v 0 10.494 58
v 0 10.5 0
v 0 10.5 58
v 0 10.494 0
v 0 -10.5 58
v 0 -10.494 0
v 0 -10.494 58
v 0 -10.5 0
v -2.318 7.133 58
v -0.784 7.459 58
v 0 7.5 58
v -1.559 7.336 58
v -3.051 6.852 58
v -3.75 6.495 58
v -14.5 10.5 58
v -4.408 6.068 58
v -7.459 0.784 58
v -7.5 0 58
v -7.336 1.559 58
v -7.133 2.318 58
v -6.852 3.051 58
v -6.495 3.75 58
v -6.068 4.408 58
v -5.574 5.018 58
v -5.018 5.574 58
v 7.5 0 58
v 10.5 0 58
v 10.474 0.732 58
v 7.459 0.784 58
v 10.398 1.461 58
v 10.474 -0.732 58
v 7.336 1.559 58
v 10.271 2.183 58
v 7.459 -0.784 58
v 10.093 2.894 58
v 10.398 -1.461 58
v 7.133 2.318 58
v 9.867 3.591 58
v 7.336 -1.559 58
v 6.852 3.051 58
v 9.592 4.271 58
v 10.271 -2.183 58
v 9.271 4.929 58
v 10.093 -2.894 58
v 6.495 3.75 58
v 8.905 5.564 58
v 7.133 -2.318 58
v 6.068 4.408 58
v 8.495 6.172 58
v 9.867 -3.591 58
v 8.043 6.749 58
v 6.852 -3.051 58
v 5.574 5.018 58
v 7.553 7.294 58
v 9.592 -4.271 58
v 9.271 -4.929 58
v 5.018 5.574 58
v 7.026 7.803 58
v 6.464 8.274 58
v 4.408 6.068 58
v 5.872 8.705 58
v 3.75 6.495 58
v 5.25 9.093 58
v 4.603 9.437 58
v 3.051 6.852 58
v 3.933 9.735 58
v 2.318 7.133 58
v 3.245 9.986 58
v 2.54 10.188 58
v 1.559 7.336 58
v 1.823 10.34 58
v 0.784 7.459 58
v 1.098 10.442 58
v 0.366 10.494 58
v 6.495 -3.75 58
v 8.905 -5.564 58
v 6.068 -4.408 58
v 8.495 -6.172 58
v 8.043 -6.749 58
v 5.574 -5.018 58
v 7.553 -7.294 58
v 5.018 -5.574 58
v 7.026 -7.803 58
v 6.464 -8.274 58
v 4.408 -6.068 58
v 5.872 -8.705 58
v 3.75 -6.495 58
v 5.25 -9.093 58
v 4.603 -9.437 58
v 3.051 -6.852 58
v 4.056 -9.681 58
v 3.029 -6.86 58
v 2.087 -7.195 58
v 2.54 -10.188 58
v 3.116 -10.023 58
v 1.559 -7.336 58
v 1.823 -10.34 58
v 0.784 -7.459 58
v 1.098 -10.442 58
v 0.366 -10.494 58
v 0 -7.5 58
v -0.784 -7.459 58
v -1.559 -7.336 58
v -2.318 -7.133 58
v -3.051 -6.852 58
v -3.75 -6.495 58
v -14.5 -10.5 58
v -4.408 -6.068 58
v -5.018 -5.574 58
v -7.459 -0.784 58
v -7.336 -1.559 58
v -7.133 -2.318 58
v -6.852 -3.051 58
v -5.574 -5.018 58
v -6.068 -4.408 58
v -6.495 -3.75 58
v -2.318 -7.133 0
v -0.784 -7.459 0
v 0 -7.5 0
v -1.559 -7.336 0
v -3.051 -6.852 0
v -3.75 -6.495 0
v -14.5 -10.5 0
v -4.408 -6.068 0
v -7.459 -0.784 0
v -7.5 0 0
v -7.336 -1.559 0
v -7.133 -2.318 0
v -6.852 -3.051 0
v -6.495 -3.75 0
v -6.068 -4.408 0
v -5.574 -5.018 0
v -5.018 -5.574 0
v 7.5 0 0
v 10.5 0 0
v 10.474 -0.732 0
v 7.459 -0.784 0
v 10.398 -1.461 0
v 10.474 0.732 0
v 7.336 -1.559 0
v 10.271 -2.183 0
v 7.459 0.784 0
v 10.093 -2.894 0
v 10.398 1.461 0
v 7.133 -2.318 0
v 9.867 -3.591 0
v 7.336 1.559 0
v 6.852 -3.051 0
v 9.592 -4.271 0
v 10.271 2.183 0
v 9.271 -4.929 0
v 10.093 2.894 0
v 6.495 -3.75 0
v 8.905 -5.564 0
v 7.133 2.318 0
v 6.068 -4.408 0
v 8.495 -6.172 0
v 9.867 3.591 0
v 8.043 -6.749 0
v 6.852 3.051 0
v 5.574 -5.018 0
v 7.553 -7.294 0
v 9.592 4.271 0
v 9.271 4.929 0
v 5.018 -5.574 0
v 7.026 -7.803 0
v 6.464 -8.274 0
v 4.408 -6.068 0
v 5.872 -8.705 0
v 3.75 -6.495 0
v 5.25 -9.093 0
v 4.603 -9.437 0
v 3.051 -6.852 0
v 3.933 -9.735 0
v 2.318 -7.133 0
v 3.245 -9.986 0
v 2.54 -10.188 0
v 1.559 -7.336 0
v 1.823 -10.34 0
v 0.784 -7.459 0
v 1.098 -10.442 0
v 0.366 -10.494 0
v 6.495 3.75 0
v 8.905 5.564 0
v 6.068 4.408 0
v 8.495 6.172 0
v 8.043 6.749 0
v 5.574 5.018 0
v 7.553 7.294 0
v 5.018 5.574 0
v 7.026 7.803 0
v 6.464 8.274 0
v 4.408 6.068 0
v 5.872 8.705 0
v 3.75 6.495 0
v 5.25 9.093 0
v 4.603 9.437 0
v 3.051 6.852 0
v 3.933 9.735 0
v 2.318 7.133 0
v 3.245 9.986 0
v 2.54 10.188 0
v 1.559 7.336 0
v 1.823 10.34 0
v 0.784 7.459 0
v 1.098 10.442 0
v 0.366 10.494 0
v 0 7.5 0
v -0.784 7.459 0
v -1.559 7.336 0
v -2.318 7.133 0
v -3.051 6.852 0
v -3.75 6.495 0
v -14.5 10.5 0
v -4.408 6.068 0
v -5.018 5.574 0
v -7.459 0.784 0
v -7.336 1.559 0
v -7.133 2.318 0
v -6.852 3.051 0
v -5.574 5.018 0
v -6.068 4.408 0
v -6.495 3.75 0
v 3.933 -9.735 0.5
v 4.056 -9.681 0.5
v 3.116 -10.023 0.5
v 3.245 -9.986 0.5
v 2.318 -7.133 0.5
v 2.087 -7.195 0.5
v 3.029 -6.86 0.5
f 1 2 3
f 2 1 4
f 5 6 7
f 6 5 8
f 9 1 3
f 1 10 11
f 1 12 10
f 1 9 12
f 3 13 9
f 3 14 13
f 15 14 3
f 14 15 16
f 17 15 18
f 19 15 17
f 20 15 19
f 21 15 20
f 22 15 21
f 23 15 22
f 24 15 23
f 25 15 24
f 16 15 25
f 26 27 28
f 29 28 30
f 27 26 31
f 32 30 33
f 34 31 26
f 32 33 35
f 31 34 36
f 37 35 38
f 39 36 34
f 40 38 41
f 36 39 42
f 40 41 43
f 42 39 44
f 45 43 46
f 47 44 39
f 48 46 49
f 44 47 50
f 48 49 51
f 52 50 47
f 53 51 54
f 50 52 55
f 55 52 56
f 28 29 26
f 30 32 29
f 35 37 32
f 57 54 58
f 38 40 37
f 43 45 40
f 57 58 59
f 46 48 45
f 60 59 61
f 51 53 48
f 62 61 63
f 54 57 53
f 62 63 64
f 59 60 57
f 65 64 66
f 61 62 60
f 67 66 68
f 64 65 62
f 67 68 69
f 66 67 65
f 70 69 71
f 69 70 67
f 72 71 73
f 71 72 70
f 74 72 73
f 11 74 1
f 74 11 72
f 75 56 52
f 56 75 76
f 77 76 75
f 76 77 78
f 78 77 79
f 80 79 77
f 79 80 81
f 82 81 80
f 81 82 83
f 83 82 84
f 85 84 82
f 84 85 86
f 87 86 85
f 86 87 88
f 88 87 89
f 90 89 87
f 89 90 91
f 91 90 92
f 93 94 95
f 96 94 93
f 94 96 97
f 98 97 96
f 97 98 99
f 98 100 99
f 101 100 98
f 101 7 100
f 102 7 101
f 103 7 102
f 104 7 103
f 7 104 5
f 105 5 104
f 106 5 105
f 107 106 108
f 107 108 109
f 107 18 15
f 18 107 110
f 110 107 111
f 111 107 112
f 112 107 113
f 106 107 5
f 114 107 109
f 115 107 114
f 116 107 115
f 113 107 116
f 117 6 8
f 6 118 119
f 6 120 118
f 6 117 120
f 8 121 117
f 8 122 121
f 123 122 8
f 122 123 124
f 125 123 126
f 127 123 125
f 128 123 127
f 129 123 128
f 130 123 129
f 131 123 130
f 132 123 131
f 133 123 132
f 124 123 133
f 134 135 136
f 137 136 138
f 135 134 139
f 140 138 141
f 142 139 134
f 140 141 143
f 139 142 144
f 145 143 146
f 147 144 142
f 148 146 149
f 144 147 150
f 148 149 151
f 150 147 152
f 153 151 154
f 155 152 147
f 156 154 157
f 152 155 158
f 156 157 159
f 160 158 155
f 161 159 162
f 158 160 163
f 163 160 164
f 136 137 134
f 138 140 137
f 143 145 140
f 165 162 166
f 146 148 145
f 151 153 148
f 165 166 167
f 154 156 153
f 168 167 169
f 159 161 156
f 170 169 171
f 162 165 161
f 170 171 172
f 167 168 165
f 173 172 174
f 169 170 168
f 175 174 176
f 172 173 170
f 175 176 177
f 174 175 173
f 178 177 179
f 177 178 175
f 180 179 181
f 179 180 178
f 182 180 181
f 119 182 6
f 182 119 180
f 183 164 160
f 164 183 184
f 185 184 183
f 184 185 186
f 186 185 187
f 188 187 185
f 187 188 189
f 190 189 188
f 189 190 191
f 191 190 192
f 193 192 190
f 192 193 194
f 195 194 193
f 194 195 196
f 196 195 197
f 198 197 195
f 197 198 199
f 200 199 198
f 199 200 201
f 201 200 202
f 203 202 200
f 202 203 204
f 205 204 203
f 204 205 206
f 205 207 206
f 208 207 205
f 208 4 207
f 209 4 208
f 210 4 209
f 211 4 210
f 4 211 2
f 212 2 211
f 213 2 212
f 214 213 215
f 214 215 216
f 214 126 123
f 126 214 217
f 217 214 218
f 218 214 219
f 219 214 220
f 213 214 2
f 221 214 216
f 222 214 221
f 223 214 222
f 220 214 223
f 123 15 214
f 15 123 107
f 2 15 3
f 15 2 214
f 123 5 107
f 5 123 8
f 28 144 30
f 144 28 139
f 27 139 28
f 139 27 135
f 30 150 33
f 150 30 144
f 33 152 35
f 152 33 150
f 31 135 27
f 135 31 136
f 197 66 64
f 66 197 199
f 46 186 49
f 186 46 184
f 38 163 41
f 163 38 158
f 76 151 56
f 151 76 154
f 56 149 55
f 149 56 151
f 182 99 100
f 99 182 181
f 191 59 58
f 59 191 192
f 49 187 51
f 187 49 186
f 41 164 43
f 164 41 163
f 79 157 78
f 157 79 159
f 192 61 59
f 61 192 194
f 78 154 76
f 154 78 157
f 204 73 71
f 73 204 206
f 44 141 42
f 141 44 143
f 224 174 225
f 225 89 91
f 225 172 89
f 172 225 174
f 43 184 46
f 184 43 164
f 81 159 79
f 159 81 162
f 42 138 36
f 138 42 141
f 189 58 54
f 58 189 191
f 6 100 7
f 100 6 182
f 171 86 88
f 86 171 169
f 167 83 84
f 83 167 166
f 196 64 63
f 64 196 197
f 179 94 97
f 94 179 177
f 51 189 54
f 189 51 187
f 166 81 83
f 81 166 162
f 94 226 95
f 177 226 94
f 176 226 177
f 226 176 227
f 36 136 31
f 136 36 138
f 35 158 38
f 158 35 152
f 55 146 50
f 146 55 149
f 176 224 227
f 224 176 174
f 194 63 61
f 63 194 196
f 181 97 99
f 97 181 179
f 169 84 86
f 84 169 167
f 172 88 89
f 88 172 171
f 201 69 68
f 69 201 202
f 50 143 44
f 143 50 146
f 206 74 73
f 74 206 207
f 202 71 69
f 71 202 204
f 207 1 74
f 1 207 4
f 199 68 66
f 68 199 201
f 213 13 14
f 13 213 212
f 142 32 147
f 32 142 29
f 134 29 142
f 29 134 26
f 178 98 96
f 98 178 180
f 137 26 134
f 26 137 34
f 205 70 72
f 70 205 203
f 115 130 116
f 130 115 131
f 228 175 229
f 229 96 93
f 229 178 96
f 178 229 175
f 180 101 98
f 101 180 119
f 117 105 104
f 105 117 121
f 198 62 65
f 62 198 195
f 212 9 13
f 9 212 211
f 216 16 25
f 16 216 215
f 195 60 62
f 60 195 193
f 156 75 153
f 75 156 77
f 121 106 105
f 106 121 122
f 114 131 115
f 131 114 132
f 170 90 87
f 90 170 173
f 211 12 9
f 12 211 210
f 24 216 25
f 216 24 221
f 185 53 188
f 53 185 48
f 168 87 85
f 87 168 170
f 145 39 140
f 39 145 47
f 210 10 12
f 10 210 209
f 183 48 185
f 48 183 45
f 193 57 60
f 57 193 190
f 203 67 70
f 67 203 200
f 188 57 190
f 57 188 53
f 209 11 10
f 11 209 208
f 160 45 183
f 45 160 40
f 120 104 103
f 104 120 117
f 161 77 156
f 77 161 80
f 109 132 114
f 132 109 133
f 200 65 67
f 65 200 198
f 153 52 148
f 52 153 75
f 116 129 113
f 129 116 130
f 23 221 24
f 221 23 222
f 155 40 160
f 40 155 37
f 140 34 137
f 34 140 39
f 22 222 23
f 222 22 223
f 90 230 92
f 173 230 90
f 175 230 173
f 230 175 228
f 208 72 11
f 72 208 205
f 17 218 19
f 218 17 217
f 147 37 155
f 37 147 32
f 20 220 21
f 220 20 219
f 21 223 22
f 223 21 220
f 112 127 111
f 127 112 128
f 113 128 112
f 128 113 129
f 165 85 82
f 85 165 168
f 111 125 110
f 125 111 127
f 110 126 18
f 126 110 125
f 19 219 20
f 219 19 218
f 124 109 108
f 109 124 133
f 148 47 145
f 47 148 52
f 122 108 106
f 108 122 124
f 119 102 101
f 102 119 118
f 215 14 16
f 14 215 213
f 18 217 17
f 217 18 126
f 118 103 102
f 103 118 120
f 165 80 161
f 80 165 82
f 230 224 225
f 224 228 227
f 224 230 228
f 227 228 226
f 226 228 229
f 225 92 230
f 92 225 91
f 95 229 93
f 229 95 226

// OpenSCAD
// PRUSA iteration3
// Bearing holders
// GNU GPL v3
// Josef Průša <iam@josefprusa.cz> and contributors
// http://www.reprap.org/wiki/Prusa_Mendel
// http://prusamendel.org

bearing_diameter = 15;
thinwall         = 3;
bearing_size     = bearing_diameter + 2 * thinwall;


module horizontal_bearing_base(bearings=1){
    translate(v=[0,0,6]) cube(size = [24,8+bearings*25,12], center = true);	
}

module horizontal_bearing_holes(bearings=1){
    cutter_lenght     = 10+bearings*25;
    one_holder_lenght = 8+25;
    holder_lenght     = 8+bearings*25;
 
    //Main bearing cut
    difference(){
        translate(v=[0,0,12]) rotate(a=[90,0,0]) translate(v=[0,0,-cutter_lenght/2]) cylinder(h = cutter_lenght, r=bearing_diameter/2, $fn=50);
        
        //Bearing retainers
        translate(v=[0,1-holder_lenght/2,3]) cube(size = [24,6,8], center = true);
        translate(v=[0,-1+holder_lenght/2,3]) cube(size = [24,6,8], center = true);
    }
 
    //Ziptie cutouts
    ziptie_cut_ofset = 0;

    for (i = [0 : bearings-1]){
        // For easier positioning I move them by half of one 
        // bearing holder then add each bearign lenght and then center again
        translate(v=[0,-holder_lenght/2,0]) translate(v=[0,one_holder_lenght/2+i*25,0]) difference(){
            union(){
                translate(v=[0,2-6,12]) rotate(a=[90,0,0]) translate(v=[0,0,0]) cylinder(h = 4, r=12.5, $fn=50);
                translate(v=[0,2+6,12]) rotate(a=[90,0,0]) translate(v=[0,0,0]) cylinder(h = 4, r=12.5, $fn=50);
            }
            translate(v=[0,10,12]) rotate(a=[90,0,0]) translate(v=[0,0,0]) cylinder(h = 24, r=10, $fn=50);
        }
    }
}

module horizontal_bearing_test(){
    difference(){
        horizontal_bearing_base(1);
        horizontal_bearing_holes(1);
    }
    translate(v=[30,0,0]) difference(){
        horizontal_bearing_base(2);
        horizontal_bearing_holes(2);
    }

    translate(v=[60,0,0]) difference(){
        horizontal_bearing_base(3);
        horizontal_bearing_holes(3);
    }
}

module vertical_bearing_base(){
    translate(v=[-2-bearing_size/4,0,29]) cube(size = [4+bearing_size/2,bearing_size,58], center = true);
    cylinder(h = 58, r=bearing_size/2, $fn = 90);
}

module vertical_bearing_holes(){
    translate(v=[0,0,-1]) cylinder(h = 62, r=bearing_diameter/2, $fn = 60);
    rotate(a=[0,0,-70]) translate(v=[8,0,31.5]) cube(size = [5,1,62], center = true);
}

//Final part
difference(){
    vertical_bearing_base();
    vertical_bearing_holes();
}
